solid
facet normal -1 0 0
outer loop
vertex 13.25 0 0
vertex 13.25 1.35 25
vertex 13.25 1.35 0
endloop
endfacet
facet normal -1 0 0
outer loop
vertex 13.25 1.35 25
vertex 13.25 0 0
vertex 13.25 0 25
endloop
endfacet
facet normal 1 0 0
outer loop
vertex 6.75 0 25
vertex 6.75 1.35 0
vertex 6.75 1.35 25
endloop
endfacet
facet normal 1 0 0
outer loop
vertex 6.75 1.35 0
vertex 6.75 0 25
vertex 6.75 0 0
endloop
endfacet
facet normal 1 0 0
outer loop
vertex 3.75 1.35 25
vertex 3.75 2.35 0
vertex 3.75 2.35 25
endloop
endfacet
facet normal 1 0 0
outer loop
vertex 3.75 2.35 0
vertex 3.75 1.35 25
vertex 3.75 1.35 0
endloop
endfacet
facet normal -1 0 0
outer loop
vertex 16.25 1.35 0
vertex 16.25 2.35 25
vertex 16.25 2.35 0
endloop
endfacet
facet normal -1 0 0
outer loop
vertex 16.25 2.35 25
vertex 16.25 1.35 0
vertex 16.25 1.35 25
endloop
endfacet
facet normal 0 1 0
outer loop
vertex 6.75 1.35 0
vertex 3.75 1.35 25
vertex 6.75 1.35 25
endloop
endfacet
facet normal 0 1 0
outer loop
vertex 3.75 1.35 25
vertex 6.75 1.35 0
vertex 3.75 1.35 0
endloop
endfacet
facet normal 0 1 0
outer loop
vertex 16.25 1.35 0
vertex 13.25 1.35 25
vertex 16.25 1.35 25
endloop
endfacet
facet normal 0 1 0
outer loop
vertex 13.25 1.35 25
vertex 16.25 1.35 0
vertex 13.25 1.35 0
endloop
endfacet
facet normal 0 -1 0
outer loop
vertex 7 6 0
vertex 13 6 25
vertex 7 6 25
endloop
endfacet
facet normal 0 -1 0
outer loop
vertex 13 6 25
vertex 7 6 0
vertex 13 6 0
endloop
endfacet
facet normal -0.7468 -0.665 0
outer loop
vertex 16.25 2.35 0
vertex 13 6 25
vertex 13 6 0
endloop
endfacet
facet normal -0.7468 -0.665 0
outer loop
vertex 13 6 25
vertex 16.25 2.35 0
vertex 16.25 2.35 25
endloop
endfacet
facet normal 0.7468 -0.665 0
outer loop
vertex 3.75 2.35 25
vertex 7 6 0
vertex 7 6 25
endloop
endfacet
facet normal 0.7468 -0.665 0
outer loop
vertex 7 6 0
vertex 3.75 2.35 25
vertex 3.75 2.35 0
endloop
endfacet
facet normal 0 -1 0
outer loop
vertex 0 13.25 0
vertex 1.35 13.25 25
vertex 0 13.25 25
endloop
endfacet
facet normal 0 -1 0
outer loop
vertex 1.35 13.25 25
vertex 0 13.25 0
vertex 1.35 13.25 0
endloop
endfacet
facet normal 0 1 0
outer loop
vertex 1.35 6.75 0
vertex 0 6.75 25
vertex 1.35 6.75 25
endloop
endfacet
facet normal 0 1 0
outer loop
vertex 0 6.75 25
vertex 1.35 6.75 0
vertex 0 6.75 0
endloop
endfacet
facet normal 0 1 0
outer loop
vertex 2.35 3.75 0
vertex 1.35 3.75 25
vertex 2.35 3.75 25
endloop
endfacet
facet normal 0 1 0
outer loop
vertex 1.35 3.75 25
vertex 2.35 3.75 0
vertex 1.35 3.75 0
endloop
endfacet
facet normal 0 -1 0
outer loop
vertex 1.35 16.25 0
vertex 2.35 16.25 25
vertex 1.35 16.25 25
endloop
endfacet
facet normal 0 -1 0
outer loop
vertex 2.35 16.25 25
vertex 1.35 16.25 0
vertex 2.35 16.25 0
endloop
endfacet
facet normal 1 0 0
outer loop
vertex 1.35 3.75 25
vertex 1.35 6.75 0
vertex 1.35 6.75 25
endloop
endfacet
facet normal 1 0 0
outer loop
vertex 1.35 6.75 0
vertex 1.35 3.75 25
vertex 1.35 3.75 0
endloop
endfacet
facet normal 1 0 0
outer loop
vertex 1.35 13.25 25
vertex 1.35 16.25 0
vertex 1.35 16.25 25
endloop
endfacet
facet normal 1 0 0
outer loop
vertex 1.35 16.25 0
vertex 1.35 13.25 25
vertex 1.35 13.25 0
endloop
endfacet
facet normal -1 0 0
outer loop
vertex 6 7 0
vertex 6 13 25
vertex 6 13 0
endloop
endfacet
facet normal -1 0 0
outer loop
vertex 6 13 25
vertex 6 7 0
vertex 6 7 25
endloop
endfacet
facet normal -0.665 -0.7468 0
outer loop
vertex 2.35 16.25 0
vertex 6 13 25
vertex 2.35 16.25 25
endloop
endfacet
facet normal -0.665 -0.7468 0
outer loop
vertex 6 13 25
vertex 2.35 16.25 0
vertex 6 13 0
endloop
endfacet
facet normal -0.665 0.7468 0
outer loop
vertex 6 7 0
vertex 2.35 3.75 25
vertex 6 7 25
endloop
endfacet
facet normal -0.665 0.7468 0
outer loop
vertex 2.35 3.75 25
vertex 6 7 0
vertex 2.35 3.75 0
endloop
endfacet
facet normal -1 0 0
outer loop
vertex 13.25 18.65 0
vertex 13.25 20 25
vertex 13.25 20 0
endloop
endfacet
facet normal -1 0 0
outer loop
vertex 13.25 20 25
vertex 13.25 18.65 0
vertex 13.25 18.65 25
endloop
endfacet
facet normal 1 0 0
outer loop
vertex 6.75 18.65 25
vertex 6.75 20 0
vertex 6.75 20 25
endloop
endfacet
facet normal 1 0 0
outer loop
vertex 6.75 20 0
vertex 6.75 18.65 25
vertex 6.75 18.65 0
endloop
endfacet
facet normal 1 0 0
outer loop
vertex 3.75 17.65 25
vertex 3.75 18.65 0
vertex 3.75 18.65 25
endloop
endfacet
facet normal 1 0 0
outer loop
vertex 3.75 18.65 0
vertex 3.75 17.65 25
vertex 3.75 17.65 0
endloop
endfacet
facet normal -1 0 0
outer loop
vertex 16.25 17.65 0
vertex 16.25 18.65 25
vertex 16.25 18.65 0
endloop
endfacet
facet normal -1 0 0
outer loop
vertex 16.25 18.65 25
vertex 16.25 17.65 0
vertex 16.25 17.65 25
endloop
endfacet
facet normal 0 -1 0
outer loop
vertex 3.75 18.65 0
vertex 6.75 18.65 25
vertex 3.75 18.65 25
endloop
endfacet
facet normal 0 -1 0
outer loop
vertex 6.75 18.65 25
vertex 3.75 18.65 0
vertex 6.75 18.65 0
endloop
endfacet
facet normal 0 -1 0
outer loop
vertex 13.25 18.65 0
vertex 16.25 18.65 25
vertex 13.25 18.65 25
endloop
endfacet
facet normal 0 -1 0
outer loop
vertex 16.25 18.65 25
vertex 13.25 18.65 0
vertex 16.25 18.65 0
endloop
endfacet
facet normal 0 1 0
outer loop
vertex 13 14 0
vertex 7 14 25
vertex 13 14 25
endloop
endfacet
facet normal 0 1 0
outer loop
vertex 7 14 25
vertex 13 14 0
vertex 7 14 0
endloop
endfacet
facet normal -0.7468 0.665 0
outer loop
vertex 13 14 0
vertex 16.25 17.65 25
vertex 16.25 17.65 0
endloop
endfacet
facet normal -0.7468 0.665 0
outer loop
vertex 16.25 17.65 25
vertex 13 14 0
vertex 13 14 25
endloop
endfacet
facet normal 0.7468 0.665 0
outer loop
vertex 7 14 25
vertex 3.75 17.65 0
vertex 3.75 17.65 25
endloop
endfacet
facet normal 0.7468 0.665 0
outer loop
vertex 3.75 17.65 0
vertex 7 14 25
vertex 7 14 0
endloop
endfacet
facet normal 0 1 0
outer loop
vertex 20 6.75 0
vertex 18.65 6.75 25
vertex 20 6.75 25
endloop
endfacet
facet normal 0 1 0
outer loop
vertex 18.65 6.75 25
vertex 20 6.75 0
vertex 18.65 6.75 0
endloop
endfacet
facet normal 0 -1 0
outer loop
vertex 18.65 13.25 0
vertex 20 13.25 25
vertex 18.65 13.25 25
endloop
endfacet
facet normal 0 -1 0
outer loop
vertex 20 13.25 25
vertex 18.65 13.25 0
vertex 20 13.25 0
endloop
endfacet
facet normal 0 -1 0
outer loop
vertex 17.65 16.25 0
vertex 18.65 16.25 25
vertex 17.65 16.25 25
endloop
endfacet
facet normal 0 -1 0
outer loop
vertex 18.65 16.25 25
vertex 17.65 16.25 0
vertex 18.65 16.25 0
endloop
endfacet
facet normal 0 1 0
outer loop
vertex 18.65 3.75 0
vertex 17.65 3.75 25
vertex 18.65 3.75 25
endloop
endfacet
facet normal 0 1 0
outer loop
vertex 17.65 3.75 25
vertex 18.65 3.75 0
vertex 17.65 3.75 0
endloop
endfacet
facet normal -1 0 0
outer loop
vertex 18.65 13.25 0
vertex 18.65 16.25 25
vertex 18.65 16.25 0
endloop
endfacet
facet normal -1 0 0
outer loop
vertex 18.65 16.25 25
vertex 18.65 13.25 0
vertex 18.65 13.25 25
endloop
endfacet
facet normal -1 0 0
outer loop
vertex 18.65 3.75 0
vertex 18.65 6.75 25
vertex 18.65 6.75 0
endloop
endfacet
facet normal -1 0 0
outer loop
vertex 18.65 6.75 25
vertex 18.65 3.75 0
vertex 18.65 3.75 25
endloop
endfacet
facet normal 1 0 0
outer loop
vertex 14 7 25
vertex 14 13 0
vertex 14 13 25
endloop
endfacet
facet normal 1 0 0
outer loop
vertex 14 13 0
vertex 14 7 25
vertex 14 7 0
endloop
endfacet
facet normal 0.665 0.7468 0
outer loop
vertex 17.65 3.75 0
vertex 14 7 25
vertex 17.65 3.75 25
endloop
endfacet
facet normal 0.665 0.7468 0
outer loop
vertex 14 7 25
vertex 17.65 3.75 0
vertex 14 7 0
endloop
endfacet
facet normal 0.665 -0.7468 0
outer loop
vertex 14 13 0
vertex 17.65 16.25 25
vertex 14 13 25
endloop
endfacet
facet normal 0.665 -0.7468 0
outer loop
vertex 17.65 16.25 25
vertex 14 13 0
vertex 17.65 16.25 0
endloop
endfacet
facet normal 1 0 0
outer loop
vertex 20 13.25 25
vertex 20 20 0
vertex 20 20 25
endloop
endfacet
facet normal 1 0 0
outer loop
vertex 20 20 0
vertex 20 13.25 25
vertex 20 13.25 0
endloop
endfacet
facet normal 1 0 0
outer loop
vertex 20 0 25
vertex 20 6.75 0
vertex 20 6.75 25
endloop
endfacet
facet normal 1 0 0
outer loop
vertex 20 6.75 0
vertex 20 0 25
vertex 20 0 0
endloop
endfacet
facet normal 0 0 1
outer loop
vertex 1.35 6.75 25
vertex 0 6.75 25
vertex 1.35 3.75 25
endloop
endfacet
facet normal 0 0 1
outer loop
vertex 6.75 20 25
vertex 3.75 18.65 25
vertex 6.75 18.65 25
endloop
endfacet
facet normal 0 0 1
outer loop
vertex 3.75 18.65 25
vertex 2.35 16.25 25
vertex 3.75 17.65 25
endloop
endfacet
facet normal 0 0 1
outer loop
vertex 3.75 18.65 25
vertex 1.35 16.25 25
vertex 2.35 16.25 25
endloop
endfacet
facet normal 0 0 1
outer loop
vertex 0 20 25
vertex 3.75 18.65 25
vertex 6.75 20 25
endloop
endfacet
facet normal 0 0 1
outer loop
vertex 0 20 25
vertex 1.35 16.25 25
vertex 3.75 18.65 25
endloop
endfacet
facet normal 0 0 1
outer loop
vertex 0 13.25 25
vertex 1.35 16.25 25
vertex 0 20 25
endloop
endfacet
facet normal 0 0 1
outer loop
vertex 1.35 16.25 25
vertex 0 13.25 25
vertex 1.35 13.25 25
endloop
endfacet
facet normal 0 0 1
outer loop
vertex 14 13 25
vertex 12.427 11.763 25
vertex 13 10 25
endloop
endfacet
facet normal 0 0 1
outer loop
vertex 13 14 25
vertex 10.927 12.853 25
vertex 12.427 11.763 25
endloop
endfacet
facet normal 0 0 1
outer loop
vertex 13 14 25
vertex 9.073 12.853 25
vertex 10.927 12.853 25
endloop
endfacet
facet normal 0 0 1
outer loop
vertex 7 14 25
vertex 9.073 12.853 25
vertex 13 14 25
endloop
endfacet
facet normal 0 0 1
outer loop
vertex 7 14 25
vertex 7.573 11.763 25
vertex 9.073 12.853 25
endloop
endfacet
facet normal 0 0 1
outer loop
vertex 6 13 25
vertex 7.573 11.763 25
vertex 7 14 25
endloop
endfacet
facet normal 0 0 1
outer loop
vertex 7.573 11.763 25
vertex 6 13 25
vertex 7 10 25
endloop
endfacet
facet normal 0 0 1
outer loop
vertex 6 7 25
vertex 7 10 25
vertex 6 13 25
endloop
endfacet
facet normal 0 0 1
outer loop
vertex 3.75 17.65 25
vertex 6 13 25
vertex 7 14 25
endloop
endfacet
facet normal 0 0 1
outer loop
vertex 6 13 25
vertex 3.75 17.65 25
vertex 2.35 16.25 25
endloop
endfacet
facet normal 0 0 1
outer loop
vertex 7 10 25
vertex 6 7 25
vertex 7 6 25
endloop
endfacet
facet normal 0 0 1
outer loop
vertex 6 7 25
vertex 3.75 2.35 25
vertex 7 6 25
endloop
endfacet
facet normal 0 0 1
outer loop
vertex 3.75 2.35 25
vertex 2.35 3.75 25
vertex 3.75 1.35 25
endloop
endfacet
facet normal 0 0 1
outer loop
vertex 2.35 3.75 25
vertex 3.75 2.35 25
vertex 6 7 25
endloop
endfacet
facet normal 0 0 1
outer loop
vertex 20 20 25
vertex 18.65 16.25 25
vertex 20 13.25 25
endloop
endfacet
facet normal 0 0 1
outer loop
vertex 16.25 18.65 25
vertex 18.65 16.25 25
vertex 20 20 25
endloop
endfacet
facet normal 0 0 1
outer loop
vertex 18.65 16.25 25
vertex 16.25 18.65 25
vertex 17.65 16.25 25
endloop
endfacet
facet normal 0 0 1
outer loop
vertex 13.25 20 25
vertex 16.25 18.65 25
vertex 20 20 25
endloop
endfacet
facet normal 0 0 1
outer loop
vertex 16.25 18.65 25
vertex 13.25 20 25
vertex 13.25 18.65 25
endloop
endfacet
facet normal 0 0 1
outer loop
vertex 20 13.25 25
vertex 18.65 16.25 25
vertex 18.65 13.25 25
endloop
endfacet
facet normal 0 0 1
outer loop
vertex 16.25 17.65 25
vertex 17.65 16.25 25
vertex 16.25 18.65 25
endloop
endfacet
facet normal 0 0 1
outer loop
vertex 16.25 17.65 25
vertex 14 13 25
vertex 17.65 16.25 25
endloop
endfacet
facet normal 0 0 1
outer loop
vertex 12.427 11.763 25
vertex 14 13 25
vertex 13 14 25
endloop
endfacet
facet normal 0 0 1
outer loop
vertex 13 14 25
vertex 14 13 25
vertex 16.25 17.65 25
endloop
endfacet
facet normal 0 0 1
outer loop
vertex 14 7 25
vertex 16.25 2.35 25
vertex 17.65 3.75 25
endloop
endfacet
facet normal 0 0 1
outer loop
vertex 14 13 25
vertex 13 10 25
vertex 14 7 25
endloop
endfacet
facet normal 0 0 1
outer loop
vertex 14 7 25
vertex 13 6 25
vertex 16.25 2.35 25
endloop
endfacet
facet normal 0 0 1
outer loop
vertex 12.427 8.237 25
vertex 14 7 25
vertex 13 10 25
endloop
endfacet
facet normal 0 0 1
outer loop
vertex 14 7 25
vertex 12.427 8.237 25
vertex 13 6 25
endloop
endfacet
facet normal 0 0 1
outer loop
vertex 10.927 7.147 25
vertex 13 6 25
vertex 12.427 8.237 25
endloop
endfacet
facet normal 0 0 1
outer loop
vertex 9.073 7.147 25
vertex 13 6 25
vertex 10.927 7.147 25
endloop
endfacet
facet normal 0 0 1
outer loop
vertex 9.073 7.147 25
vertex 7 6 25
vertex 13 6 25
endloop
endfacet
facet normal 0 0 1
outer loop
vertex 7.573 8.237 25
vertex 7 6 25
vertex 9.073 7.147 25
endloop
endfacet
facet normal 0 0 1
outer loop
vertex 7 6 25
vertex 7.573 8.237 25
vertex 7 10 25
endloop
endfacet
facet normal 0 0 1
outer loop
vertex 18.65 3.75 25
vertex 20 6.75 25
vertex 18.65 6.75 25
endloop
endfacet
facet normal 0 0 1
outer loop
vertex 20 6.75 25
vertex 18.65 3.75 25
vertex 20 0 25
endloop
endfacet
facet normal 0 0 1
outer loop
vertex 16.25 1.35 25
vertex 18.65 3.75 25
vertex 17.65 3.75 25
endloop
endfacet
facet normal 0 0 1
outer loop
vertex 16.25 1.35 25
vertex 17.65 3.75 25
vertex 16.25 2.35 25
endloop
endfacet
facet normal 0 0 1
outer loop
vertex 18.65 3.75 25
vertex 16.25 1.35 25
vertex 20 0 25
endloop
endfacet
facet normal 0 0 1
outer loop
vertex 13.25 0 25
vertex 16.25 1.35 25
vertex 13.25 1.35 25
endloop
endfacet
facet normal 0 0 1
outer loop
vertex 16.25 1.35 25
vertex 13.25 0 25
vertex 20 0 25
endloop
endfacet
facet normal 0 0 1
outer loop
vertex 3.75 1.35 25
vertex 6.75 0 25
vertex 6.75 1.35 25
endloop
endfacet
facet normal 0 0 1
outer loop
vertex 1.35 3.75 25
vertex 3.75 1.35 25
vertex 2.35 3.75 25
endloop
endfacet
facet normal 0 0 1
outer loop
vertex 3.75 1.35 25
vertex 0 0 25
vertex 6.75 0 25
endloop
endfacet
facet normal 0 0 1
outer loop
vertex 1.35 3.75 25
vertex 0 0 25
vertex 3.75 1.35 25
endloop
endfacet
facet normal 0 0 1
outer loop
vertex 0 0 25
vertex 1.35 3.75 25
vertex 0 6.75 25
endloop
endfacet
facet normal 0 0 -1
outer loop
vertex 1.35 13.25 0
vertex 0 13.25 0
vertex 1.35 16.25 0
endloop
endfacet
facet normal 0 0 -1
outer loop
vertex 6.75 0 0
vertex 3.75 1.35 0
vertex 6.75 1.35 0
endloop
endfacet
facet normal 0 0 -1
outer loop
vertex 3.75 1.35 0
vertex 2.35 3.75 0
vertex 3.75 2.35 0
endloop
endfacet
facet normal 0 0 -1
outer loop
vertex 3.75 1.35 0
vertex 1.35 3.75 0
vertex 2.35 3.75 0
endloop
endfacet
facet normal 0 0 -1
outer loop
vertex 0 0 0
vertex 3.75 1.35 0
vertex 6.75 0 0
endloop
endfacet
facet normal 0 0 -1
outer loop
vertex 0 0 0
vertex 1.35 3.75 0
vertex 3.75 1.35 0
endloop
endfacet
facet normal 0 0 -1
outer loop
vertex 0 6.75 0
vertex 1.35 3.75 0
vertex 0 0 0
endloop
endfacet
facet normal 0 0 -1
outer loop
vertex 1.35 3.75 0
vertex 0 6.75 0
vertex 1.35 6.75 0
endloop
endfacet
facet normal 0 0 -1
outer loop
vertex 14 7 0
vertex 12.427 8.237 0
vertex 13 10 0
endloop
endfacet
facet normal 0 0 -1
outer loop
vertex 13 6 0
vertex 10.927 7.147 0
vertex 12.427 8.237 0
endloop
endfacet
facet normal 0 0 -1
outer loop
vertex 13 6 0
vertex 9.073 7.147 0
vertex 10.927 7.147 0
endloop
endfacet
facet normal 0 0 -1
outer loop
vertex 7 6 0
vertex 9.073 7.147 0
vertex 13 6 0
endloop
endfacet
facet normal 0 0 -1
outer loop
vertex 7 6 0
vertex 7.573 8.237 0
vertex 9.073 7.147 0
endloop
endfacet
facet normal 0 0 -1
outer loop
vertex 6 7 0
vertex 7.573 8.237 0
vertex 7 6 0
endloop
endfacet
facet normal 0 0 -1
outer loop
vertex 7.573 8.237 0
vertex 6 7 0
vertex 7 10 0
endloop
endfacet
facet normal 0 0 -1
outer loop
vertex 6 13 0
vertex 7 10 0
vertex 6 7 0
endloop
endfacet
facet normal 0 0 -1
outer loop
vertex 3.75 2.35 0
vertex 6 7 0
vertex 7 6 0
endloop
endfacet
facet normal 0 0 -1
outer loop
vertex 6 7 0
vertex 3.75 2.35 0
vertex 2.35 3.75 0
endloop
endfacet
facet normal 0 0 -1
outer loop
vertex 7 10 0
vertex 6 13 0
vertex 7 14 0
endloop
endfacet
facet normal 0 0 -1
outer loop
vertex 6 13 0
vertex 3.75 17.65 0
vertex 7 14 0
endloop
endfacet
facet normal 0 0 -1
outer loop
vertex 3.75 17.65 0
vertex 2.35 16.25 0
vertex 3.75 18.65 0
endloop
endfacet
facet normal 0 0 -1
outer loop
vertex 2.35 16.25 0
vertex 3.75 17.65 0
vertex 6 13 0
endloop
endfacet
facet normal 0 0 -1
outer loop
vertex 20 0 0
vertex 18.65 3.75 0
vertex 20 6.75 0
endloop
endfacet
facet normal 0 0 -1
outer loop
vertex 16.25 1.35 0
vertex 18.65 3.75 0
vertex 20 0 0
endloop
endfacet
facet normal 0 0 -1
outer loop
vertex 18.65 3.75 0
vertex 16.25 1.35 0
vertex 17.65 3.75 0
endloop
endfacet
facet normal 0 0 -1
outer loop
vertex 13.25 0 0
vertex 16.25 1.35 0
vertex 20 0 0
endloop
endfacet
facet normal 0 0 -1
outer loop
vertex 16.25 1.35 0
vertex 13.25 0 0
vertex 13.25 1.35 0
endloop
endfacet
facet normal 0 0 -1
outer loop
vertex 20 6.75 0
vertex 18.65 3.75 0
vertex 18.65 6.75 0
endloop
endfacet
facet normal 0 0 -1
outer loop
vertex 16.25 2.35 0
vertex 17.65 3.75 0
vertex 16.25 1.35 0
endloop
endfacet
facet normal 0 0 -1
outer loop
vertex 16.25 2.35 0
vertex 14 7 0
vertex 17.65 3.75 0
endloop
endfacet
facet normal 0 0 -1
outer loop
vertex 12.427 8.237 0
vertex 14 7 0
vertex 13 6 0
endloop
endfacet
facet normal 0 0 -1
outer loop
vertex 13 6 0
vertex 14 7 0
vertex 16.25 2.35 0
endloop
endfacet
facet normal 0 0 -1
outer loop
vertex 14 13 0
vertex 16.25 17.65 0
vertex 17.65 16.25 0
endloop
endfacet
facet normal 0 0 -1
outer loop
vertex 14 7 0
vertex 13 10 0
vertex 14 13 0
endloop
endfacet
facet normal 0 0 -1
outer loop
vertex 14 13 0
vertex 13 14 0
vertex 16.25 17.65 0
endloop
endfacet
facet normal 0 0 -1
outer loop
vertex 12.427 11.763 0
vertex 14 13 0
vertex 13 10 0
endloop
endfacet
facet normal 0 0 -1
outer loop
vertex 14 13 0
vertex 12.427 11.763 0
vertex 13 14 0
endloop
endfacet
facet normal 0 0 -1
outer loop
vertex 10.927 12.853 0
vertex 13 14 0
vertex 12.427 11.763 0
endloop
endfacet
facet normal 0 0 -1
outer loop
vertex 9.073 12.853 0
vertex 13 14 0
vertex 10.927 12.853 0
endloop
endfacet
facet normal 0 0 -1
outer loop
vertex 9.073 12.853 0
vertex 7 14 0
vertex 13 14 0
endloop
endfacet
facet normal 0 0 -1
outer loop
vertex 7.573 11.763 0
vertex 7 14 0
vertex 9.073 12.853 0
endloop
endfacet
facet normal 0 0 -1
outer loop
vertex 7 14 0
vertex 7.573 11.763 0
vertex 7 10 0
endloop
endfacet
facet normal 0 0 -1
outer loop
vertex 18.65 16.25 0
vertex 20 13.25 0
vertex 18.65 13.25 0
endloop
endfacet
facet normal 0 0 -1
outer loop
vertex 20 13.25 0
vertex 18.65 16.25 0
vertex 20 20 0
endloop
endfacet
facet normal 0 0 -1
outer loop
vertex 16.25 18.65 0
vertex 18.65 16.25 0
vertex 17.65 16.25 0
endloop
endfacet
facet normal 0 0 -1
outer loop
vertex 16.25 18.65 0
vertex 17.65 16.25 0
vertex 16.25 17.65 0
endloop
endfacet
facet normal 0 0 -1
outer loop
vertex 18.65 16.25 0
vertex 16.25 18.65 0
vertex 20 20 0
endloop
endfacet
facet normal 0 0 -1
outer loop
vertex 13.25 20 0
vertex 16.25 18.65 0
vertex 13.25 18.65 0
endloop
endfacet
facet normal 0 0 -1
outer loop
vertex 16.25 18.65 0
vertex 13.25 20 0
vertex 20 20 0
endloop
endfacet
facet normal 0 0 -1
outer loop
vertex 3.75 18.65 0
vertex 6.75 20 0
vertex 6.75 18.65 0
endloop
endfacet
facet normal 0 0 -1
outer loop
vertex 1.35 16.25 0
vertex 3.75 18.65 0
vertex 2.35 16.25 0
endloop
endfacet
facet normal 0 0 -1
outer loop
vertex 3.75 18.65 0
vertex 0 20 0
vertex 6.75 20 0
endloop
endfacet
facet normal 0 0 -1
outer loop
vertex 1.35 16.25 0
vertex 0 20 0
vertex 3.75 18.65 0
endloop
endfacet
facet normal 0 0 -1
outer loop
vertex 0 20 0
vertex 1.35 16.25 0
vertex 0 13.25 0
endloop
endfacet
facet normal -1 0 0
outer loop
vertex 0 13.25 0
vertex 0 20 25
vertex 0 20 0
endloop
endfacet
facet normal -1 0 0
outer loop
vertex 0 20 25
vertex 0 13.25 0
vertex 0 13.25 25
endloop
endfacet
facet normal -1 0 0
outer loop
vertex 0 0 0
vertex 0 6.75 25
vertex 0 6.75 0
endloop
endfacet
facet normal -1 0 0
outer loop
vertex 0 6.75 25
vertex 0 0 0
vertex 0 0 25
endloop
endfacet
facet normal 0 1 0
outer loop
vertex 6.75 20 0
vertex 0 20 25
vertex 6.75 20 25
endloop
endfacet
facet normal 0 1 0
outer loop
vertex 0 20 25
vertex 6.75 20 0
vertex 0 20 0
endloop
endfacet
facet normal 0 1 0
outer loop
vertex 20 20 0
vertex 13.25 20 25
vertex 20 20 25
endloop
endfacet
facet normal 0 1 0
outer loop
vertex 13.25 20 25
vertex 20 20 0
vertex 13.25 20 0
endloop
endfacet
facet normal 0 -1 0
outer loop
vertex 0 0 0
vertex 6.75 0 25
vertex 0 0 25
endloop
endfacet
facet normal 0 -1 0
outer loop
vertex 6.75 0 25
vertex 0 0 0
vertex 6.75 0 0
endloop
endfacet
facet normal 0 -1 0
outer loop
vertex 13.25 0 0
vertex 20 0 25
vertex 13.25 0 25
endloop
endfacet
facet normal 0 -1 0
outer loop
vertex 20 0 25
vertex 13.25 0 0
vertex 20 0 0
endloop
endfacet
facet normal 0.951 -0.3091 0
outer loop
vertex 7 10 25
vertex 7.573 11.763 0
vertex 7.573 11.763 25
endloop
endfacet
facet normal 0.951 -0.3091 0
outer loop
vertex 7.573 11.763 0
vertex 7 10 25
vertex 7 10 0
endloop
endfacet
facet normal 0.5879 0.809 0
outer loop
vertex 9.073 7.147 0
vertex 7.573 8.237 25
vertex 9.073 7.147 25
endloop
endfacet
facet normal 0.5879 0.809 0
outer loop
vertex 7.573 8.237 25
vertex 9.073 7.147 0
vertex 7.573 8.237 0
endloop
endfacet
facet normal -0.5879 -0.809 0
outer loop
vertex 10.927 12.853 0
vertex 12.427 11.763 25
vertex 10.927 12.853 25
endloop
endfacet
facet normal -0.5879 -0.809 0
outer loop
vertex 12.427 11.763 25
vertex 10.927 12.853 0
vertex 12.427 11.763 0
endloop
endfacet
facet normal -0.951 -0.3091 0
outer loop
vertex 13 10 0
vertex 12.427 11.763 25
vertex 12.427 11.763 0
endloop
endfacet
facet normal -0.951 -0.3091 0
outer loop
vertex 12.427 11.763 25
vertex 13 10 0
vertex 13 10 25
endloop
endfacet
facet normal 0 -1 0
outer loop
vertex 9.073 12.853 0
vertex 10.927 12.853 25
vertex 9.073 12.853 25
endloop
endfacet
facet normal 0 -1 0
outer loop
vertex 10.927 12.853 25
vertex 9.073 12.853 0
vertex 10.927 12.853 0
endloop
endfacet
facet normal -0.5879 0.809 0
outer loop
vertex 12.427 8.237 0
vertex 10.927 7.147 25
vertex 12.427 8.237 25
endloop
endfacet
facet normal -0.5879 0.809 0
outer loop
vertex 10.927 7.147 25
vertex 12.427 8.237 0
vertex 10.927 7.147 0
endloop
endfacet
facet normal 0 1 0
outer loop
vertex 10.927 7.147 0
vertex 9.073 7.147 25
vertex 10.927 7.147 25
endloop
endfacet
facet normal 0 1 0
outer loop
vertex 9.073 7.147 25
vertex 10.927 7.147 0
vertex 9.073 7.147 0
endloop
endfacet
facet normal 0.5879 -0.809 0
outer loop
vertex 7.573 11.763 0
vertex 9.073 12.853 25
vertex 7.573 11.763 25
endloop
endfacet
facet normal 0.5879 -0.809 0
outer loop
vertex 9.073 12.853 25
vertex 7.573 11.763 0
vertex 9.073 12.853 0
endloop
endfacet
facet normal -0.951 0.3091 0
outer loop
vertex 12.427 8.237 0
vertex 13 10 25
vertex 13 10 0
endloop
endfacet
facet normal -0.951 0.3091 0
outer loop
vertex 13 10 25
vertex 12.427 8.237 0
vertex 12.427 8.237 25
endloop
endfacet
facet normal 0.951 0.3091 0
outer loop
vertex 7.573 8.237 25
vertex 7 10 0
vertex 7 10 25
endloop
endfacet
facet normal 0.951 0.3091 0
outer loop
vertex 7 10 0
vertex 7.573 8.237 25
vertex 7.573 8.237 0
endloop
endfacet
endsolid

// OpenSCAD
//Specify the height
Height = 25 ; // [1:1:500]
//Specify the inner diameter
InnerDiameter = 6 ; // [5:1:6]

2020_Profile ();

module 2020_Profile() {
    color ("silver")
    difference () {
        translate ([0,0,0]) cube ([20,20,Height]);
        translate ([10,10,-1]) cylinder(d=InnerDiameter,h=Height+2);

        2020_ProfileCutOut (Height=Height);
        mirror ([1,0,0]) rotate ([0,0,90]) 2020_ProfileCutOut (Height=Height);
        translate ([0,20,0]) mirror ([0,1,0]) 2020_ProfileCutOut (Height=Height);
        translate ([20,20,0]) rotate ([0,0,-90]) mirror ([0,1,0]) 2020_ProfileCutOut (Height=Height);
    }
}
module 2020_ProfileCutOut () {    
    union () {
        translate ([10-3.25,-0.5,-1]) cube ([6.5,6,Height+2]);
        hull () {
            translate ([10-6.25,1.35,-1]) cube ([12.5,1,Height+2]);
            translate ([10-3,5,-1]) cube ([6,1,Height+2]);
        }
    }
}
